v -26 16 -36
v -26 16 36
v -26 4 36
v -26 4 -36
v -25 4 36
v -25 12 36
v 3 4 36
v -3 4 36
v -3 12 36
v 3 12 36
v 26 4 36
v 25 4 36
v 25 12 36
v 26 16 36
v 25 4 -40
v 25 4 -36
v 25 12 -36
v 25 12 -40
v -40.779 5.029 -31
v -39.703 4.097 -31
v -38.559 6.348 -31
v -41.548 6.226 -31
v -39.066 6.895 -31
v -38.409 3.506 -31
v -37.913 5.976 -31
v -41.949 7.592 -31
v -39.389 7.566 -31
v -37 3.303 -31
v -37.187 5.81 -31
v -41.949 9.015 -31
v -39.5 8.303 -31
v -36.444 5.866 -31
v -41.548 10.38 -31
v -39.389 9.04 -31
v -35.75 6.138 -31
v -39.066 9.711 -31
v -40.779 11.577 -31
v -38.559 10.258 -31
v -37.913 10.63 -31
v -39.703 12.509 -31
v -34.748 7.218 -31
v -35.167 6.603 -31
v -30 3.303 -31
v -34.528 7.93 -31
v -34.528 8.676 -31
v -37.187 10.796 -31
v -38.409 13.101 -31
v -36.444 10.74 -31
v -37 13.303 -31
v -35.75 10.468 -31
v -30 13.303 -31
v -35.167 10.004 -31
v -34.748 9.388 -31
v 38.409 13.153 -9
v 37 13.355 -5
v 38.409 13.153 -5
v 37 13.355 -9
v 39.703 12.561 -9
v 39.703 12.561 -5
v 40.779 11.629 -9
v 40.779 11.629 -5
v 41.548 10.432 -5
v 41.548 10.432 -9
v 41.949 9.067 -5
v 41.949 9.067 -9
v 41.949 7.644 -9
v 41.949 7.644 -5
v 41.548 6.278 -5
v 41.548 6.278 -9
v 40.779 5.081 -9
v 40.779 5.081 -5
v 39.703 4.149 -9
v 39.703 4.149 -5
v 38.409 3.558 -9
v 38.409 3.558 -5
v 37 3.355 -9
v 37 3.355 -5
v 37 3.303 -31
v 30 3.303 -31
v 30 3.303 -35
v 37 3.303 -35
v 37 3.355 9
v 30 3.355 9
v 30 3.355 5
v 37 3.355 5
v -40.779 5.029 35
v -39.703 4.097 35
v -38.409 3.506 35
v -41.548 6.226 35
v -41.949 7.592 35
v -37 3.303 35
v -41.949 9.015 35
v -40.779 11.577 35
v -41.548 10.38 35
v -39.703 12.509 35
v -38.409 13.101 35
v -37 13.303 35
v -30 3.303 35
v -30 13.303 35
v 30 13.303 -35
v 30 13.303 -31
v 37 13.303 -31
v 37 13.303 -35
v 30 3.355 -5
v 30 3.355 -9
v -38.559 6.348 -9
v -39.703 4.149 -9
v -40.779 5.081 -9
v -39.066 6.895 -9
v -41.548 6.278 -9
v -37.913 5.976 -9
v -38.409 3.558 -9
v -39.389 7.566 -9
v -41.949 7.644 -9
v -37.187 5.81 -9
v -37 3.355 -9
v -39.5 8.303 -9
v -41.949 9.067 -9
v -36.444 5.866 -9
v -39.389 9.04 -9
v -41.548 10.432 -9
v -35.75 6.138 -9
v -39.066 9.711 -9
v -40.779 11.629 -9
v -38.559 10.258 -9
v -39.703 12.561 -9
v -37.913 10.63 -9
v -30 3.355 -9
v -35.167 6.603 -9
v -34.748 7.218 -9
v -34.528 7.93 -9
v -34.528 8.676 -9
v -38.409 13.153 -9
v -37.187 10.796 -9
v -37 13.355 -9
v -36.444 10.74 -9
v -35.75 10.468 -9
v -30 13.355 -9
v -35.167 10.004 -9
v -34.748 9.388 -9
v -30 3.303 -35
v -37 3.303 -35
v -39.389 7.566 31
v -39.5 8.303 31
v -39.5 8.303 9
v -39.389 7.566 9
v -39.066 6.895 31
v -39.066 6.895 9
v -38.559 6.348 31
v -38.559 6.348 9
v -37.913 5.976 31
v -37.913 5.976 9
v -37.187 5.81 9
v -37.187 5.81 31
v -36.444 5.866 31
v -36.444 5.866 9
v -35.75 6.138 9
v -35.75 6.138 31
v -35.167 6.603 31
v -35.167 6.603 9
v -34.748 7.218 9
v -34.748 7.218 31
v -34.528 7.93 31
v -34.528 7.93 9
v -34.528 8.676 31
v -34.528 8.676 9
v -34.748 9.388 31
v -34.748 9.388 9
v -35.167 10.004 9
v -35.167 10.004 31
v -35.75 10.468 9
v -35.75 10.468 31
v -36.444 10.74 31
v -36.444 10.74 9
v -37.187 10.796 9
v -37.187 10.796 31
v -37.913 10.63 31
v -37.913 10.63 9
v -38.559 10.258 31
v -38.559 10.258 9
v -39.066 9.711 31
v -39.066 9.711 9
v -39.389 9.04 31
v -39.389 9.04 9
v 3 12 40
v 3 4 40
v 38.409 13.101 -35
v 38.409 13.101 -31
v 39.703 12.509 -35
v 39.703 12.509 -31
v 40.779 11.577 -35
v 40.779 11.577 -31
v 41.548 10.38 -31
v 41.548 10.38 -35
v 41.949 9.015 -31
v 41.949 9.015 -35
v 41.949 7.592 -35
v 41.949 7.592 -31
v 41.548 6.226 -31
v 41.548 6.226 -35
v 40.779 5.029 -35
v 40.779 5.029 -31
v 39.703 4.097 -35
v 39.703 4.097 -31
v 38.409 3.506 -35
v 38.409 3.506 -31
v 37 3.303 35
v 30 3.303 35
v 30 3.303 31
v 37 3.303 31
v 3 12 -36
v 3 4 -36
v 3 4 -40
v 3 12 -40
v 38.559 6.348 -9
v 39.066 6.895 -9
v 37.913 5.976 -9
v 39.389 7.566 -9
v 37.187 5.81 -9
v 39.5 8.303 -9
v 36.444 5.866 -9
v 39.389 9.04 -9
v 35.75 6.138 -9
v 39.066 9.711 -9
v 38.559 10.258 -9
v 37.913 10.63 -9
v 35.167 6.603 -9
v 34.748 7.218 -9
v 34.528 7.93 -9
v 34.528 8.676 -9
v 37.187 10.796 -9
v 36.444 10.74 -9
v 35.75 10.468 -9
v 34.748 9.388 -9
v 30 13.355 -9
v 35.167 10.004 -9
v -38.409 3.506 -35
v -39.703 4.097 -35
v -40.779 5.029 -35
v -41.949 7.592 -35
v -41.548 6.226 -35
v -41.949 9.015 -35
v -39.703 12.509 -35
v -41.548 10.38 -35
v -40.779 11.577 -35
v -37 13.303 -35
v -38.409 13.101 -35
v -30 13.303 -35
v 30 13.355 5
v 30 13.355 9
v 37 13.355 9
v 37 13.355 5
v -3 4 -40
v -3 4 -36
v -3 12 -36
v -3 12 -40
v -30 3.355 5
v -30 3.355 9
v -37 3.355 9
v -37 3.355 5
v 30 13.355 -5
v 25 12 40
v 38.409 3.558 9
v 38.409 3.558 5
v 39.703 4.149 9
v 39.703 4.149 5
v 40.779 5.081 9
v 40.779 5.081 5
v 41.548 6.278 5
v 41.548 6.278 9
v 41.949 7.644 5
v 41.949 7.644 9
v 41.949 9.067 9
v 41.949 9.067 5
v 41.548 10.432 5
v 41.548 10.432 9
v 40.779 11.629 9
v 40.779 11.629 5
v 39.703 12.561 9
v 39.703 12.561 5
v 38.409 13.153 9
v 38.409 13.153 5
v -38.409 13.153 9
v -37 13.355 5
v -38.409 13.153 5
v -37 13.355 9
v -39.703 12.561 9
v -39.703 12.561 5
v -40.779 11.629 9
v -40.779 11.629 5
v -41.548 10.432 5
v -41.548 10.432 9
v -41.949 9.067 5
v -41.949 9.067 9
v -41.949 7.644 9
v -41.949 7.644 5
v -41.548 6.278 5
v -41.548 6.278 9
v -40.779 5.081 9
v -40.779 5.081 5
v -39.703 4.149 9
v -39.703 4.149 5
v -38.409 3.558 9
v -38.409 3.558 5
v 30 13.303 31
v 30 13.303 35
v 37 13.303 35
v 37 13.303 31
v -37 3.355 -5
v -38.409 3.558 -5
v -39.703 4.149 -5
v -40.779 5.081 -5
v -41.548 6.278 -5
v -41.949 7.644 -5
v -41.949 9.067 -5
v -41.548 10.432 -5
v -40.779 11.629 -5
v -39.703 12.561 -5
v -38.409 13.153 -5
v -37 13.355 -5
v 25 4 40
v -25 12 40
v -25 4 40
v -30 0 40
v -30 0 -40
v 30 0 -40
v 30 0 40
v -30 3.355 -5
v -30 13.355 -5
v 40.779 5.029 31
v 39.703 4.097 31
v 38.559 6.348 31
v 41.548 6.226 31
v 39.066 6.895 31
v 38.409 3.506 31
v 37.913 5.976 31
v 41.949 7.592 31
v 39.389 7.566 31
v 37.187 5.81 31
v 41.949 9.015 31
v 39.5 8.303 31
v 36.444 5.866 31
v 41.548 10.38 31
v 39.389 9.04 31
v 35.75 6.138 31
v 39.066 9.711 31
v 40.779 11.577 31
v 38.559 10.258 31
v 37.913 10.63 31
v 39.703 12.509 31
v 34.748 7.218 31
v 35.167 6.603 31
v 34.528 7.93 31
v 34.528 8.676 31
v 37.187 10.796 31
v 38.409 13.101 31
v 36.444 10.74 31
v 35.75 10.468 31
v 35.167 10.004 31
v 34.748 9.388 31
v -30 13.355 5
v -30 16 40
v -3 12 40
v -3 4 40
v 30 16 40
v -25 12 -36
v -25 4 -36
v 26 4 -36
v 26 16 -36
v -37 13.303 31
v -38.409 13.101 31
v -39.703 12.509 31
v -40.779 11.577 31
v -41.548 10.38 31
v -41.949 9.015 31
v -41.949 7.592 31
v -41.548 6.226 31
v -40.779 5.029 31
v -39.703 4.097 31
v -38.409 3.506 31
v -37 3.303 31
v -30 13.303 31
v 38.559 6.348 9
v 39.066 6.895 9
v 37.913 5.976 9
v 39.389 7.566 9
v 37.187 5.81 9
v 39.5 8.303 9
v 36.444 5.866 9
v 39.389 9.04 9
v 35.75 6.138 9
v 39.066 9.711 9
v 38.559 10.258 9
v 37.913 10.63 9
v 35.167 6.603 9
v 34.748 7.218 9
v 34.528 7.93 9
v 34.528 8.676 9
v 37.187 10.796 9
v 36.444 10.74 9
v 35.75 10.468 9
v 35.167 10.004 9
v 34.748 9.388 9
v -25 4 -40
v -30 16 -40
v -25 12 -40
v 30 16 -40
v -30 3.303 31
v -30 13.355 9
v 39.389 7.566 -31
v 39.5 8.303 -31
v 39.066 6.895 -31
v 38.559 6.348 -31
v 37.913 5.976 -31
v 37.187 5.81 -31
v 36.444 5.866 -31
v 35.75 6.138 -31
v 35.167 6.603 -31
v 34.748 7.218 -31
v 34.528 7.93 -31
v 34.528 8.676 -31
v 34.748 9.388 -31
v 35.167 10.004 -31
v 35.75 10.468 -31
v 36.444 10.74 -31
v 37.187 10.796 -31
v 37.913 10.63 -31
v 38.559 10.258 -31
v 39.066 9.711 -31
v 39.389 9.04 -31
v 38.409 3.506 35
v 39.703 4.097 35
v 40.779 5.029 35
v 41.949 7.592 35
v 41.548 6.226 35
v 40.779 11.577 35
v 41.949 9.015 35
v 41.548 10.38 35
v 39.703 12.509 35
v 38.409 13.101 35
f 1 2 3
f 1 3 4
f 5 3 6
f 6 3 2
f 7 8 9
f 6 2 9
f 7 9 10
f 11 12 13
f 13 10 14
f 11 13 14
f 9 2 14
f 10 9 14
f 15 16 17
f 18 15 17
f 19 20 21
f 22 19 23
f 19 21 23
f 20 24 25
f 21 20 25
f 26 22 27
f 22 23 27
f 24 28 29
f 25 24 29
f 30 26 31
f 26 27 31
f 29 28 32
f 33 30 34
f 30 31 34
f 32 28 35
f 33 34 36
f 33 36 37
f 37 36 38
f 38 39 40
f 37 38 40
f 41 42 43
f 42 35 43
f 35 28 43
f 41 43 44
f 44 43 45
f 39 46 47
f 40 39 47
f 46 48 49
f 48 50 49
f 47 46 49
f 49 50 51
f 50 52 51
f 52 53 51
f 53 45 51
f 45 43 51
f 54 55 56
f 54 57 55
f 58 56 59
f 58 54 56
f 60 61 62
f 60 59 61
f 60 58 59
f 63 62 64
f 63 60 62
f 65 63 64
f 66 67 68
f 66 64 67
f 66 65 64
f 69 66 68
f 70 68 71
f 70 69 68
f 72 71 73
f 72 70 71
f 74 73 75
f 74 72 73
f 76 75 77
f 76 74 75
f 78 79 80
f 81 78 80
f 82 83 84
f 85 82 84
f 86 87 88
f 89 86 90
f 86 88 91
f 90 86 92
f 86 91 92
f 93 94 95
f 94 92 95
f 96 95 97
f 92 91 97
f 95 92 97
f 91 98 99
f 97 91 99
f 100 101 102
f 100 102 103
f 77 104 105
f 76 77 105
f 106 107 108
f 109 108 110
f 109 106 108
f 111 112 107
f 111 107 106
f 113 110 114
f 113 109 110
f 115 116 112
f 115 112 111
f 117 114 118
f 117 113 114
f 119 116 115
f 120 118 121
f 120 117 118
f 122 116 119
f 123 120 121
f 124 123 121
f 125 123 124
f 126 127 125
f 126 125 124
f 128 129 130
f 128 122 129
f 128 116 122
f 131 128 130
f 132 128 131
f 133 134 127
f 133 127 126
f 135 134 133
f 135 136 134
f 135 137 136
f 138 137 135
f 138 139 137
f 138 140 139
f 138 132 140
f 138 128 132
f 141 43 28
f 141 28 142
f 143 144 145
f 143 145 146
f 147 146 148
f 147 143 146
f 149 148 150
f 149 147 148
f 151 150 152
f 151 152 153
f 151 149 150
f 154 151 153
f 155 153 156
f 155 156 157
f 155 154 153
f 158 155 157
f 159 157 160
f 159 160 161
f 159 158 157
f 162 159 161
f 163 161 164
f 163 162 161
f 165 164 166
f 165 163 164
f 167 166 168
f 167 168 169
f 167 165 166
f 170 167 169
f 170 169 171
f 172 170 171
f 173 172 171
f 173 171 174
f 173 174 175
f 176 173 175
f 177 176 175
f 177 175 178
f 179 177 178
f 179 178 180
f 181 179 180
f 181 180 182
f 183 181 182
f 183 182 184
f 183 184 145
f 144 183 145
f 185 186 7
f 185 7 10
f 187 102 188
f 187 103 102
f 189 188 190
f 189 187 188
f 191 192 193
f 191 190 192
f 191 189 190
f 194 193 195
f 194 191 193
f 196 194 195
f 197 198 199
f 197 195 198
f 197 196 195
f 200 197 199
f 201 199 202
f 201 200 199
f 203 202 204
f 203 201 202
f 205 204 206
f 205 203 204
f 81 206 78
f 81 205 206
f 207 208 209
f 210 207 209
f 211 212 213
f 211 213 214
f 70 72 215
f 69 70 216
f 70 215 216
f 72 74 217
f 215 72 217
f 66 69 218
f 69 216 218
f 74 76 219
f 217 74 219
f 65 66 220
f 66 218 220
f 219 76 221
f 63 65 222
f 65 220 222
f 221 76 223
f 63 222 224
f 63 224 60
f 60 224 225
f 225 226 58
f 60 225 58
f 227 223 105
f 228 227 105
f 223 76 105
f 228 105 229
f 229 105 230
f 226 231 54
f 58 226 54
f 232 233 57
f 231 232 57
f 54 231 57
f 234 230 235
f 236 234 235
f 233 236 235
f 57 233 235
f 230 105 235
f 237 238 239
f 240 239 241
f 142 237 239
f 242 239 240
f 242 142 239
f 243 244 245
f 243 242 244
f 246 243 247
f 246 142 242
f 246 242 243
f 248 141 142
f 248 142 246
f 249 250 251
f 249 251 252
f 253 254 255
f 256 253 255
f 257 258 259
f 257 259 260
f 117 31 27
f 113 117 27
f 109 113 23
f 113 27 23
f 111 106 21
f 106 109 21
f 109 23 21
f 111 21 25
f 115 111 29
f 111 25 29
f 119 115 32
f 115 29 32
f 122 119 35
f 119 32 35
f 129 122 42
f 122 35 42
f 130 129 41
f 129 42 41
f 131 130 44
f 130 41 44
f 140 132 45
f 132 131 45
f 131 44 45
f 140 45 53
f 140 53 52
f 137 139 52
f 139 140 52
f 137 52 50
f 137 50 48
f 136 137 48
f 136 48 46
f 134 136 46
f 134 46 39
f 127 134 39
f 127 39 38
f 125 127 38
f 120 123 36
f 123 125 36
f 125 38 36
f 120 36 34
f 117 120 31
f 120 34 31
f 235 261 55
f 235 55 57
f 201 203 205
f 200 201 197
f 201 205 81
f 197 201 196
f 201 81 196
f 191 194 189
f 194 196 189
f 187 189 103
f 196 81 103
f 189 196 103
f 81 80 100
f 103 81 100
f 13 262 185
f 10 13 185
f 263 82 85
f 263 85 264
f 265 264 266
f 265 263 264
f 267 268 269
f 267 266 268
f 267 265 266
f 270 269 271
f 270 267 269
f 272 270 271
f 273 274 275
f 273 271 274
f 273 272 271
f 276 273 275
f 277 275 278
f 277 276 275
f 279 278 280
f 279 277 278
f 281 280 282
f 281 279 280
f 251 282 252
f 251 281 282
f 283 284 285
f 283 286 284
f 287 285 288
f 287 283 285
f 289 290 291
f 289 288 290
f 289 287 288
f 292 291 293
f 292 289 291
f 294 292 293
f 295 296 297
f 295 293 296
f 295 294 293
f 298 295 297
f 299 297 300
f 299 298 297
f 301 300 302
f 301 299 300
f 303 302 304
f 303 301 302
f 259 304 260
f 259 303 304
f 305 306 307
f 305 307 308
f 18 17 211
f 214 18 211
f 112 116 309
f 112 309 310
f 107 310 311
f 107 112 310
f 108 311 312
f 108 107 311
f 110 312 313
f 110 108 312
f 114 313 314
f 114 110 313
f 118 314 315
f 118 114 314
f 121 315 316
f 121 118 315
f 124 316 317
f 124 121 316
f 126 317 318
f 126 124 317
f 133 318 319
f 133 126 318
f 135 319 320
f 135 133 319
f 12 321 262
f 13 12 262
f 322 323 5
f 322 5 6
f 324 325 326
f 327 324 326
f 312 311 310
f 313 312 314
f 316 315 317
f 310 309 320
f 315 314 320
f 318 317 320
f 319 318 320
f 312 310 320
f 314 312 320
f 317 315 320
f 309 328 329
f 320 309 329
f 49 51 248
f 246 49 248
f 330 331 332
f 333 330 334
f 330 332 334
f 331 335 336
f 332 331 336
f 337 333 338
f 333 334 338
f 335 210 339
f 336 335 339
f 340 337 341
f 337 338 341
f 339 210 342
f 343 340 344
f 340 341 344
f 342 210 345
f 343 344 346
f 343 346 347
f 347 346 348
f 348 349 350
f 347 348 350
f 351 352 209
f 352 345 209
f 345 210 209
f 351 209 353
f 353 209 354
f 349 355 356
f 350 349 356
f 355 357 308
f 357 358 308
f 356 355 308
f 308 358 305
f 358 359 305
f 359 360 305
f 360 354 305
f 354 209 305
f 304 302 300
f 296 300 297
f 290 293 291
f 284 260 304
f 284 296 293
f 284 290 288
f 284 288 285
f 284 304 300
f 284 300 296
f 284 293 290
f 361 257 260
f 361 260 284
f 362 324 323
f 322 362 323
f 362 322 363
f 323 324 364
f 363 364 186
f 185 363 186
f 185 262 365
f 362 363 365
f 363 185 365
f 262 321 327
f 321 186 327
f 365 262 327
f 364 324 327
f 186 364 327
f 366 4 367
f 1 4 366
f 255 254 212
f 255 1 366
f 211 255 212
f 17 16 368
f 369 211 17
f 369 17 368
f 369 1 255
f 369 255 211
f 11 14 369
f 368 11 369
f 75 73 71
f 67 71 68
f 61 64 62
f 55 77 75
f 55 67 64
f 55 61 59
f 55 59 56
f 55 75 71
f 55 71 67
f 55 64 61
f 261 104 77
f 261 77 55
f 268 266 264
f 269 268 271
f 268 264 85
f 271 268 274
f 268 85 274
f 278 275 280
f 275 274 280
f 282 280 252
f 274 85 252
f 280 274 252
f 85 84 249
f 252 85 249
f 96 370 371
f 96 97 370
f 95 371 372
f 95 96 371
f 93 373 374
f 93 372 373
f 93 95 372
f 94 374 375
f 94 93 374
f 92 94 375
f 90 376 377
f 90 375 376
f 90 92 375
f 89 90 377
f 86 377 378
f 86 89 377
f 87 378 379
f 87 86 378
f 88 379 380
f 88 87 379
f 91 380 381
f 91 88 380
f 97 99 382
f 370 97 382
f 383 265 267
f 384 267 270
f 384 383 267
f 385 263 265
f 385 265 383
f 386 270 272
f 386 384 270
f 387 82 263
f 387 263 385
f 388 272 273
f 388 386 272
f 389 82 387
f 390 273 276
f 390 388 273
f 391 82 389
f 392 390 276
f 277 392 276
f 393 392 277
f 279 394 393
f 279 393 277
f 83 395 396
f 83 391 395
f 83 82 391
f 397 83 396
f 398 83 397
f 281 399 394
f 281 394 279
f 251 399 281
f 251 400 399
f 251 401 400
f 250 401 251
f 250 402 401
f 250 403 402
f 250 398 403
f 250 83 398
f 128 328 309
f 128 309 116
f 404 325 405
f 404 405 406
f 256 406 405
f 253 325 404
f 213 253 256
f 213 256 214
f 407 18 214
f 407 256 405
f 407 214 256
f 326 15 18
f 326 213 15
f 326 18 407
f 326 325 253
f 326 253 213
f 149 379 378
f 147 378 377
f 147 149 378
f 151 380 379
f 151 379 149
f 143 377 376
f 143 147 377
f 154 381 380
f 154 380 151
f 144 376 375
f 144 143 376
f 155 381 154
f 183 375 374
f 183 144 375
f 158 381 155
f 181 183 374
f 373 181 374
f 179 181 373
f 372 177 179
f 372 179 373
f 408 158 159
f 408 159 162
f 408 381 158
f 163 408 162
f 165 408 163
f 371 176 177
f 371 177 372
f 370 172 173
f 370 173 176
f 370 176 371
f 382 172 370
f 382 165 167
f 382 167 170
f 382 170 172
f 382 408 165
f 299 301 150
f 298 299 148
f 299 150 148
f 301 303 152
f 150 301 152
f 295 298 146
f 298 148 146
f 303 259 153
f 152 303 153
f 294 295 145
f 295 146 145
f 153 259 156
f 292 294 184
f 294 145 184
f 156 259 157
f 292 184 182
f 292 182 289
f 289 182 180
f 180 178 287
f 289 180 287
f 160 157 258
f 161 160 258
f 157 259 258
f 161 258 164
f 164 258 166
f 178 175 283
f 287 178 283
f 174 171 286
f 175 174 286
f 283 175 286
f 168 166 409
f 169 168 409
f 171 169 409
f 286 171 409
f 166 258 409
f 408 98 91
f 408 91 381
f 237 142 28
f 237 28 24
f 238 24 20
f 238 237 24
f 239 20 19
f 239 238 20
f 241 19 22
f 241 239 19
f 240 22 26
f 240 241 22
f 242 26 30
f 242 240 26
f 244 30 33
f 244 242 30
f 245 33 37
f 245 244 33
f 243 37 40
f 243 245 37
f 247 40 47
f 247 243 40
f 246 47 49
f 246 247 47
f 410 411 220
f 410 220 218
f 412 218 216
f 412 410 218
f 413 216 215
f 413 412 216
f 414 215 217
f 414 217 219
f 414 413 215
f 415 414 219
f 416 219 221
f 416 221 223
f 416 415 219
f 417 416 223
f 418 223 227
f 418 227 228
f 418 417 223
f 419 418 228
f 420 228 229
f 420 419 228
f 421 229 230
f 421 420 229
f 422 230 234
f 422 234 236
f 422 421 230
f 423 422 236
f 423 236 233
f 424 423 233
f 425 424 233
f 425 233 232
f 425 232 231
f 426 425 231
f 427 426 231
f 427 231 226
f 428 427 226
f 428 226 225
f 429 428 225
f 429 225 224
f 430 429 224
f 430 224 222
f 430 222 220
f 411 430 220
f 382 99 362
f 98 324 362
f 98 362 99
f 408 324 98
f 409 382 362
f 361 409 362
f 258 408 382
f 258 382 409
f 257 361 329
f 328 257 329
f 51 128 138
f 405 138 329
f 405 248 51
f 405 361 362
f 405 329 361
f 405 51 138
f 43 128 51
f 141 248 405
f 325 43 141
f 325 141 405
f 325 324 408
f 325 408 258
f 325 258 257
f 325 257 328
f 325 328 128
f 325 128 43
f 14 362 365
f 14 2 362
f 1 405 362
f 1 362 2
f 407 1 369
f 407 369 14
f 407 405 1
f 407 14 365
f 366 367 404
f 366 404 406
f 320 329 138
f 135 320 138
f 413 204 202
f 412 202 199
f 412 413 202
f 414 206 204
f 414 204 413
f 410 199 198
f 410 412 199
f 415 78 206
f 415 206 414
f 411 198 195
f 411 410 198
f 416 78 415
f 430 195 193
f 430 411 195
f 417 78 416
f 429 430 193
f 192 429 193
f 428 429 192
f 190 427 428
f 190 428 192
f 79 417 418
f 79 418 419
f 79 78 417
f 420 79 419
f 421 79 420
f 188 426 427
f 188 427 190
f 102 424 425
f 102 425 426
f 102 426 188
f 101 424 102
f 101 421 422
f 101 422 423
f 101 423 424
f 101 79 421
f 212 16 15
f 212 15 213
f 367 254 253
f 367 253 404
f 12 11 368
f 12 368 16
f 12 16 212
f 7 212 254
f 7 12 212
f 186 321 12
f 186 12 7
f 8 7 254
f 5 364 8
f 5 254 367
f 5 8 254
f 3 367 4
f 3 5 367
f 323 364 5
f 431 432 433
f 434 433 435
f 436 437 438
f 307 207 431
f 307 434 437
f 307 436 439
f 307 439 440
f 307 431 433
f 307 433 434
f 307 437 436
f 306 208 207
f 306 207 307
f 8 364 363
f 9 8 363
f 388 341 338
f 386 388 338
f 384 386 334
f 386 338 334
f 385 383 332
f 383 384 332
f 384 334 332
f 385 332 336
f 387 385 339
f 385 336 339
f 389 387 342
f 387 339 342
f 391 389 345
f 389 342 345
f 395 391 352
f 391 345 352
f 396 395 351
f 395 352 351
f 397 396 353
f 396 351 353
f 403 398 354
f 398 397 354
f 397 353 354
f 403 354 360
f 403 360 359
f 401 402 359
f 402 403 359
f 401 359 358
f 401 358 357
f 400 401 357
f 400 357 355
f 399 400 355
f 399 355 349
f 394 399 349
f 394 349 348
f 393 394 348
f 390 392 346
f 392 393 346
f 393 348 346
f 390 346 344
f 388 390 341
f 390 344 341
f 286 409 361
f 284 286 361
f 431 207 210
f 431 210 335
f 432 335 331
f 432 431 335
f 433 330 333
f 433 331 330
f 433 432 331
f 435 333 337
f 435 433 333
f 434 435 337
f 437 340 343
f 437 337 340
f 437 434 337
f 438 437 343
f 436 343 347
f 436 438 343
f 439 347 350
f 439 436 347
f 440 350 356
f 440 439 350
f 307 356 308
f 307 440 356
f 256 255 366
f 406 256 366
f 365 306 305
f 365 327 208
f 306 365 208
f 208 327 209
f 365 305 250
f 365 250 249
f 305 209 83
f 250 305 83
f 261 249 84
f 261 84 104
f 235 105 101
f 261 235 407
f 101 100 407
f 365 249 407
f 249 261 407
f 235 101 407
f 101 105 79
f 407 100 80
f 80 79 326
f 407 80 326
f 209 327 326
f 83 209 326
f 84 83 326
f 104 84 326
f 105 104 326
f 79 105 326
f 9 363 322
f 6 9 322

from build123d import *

# Parameters (mm, degrees)
SKETCH2_W                   = 60
SKETCH2_H                   = 80
BOSS_EXTRUDE2_DEPTH         = 16
SKETCH6_W                   = 52
SKETCH6_H                   = 72
CUT_EXTRUDE1_DEPTH          = 12
CUT_EXTRUDE2_DEPTH          = 16
CUT_EXTRUDE2_DEPTH_BACK     = 106
SKETCH7_W                   = 22
SKETCH7_H                   = 8
SKETCH8_W                   = 4
SKETCH8_H                   = 10
BOSS_EXTRUDE3_DEPTH         = 12
FILLET1_RADIUS              = 5
FILLET1_LENGTH              = 4
FILLET2_RADIUS              = 5
FILLET2_LENGTH              = 4
FILLET3_RADIUS              = 5
FILLET3_LENGTH              = 4
FILLET4_RADIUS              = 5
FILLET4_LENGTH              = 4
BOSS_EXTRUDE4_START         = -2
SKETCH9_R                   = 2.5
BOSS_EXTRUDE4_DEPTH         = 26
MIRROR2_START               = -2
MIRROR2_COPY_1_SKETCH_R     = 2.5
MIRROR2_COPY_1_DEPTH        = 26
FILLET1_OF_MIRROR2_2_RADIUS = 5
FILLET1_OF_MIRROR2_2_LENGTH = 4
FILLET2_OF_MIRROR2_2_RADIUS = 5
FILLET2_OF_MIRROR2_2_LENGTH = 4
FILLET3_OF_MIRROR2_2_RADIUS = 5
FILLET3_OF_MIRROR2_2_LENGTH = 4
FILLET4_OF_MIRROR2_2_RADIUS = 5
FILLET4_OF_MIRROR2_2_LENGTH = 4


with BuildPart() as part:
    # Sketch2 → Boss-Extrude2 (new body)
    with BuildSketch(Plane(origin=(0, 0, 0), x_dir=(1, 0, 0), z_dir=(0, 1, 0))):
        Rectangle(SKETCH2_W, SKETCH2_H)
    extrude(amount=BOSS_EXTRUDE2_DEPTH)

    # Sketch6 → Cut-Extrude1 (cut)
    with BuildSketch(Plane(origin=(0, 16, 0), x_dir=(1, 0, 0), z_dir=(0, 1, 0))):
        Rectangle(SKETCH6_W, SKETCH6_H)
    extrude(amount=-CUT_EXTRUDE1_DEPTH, mode=Mode.SUBTRACT)

    # Sketch7 → Cut-Extrude2 (cut, two sides: drawn at the far end of the back side and taken through both)
    with BuildSketch(Plane(origin=(0, 0, -40), x_dir=(-1, 0, 0), z_dir=(0, 0, -1)).offset(-CUT_EXTRUDE2_DEPTH_BACK)):
        with Locations((-14, 8)):
            Rectangle(SKETCH7_W, SKETCH7_H)
        with Locations((14, 8)):
            Rectangle(SKETCH7_W, SKETCH7_H)
    extrude(amount=CUT_EXTRUDE2_DEPTH + CUT_EXTRUDE2_DEPTH_BACK, mode=Mode.SUBTRACT)

    # Sketch8 → Boss-Extrude3 (add)
    with BuildSketch(Plane(origin=(30, 0, 0), x_dir=(0, 0, -1), z_dir=(1, 0, 0))):
        with Locations((-33, 8.303078398)):
            Rectangle(SKETCH8_W, SKETCH8_H)
        with Locations((-7, 8.355173675)):
            Rectangle(SKETCH8_W, SKETCH8_H)
        with Locations((7, 8.355173675)):
            Rectangle(SKETCH8_W, SKETCH8_H)
        with Locations((33, 8.303078398)):
            Rectangle(SKETCH8_W, SKETCH8_H)
    boss_extrude3 = extrude(amount=BOSS_EXTRUDE3_DEPTH)

    # Fillet1: full round fillet: the end face becomes a half cylinder, R = half its width
    fillet1_face = Plane((42, 8.303078398, 33), x_dir=(0, 0, 1), z_dir=(1, 0, 0))  # on the end face: x along it, z out of the body
    fillet1_slab = fillet1_face.offset(-FILLET1_RADIUS / 2) * Box(FILLET1_LENGTH, 2 * FILLET1_RADIUS, FILLET1_RADIUS, mode=Mode.PRIVATE)  # the body's end, R deep
    fillet1_round = Plane((37, 8.303078398, 33), x_dir=(1, 0, 0), z_dir=(0, 0, 1)) * Cylinder(FILLET1_RADIUS, FILLET1_LENGTH, mode=Mode.PRIVATE)  # its axis R under the face
    add(fillet1_slab - fillet1_round, mode=Mode.SUBTRACT)

    # Fillet2: full round fillet: the end face becomes a half cylinder, R = half its width
    fillet2_face = Plane((42, 8.355173675, 7), x_dir=(0, 0, 1), z_dir=(1, 0, 0))  # on the end face: x along it, z out of the body
    fillet2_slab = fillet2_face.offset(-FILLET2_RADIUS / 2) * Box(FILLET2_LENGTH, 2 * FILLET2_RADIUS, FILLET2_RADIUS, mode=Mode.PRIVATE)  # the body's end, R deep
    fillet2_round = Plane((37, 8.355173675, 7), x_dir=(1, 0, 0), z_dir=(0, 0, 1)) * Cylinder(FILLET2_RADIUS, FILLET2_LENGTH, mode=Mode.PRIVATE)  # its axis R under the face
    add(fillet2_slab - fillet2_round, mode=Mode.SUBTRACT)

    # Fillet3: full round fillet: the end face becomes a half cylinder, R = half its width
    fillet3_face = Plane((42, 8.355173675, -7), x_dir=(0, 0, -1), z_dir=(1, 0, 0))  # on the end face: x along it, z out of the body
    fillet3_slab = fillet3_face.offset(-FILLET3_RADIUS / 2) * Box(FILLET3_LENGTH, 2 * FILLET3_RADIUS, FILLET3_RADIUS, mode=Mode.PRIVATE)  # the body's end, R deep
    fillet3_round = Plane((37, 8.355173675, -7), x_dir=(1, 0, 0), z_dir=(0, 0, -1)) * Cylinder(FILLET3_RADIUS, FILLET3_LENGTH, mode=Mode.PRIVATE)  # its axis R under the face
    add(fillet3_slab - fillet3_round, mode=Mode.SUBTRACT)

    # Fillet4: full round fillet: the end face becomes a half cylinder, R = half its width
    fillet4_face = Plane((42, 8.303078398, -33), x_dir=(0, 0, -1), z_dir=(1, 0, 0))  # on the end face: x along it, z out of the body
    fillet4_slab = fillet4_face.offset(-FILLET4_RADIUS / 2) * Box(FILLET4_LENGTH, 2 * FILLET4_RADIUS, FILLET4_RADIUS, mode=Mode.PRIVATE)  # the body's end, R deep
    fillet4_round = Plane((37, 8.303078398, -33), x_dir=(1, 0, 0), z_dir=(0, 0, -1)) * Cylinder(FILLET4_RADIUS, FILLET4_LENGTH, mode=Mode.PRIVATE)  # its axis R under the face
    add(fillet4_slab - fillet4_round, mode=Mode.SUBTRACT)

    # Sketch9 → Boss-Extrude4 (add)
    with BuildSketch(Plane(origin=(0, 0, 31), x_dir=(-1, 0, 0), z_dir=(0, 0, -1)).offset(BOSS_EXTRUDE4_START)):
        with Locations(Location((-37, 8.303078398, 0), (0, 0, 180))):
            Circle(SKETCH9_R)
    boss_extrude4 = extrude(amount=BOSS_EXTRUDE4_DEPTH)

    # Mirror1: Boss-Extrude4 across plane
    add(boss_extrude4.mirror(Plane(origin=(0, 0, 0), x_dir=(1, 0, 0), z_dir=(0, 0, -1))))

    # Mirror2: Boss-Extrude3, Boss-Extrude4 across plane
    add(boss_extrude3.mirror(Plane(origin=(0, 0, 0), x_dir=(0, 0, 1), z_dir=(1, 0, 0))))
    add(boss_extrude4.mirror(Plane(origin=(0, 0, 0), x_dir=(0, 0, 1), z_dir=(1, 0, 0))))

    # Mirror2 copy 1 sketch → Mirror2 copy 1 (add)
    with BuildSketch(Plane.XY.offset(-31).offset(MIRROR2_START)):
        with Locations(Location((-37, 8.303078398, 0), (0, 0, 180))):
            Circle(MIRROR2_COPY_1_SKETCH_R)
    extrude(amount=MIRROR2_COPY_1_DEPTH)

    # Fillet1 of Mirror2 2: full round fillet: the end face becomes a half cylinder, R = half its width
    fillet1_of_mirror2_2_face = Plane((-42, 8.303078398, 33), x_dir=(0, 0, 1), z_dir=(-1, 0, 0))  # on the end face: x along it, z out of the body
    fillet1_of_mirror2_2_slab = fillet1_of_mirror2_2_face.offset(-FILLET1_OF_MIRROR2_2_RADIUS / 2) * Box(FILLET1_OF_MIRROR2_2_LENGTH, 2 * FILLET1_OF_MIRROR2_2_RADIUS, FILLET1_OF_MIRROR2_2_RADIUS, mode=Mode.PRIVATE)  # the body's end, R deep
    fillet1_of_mirror2_2_round = Plane((-37, 8.303078398, 33), x_dir=(-1, 0, 0), z_dir=(0, 0, 1)) * Cylinder(FILLET1_OF_MIRROR2_2_RADIUS, FILLET1_OF_MIRROR2_2_LENGTH, mode=Mode.PRIVATE)  # its axis R under the face
    add(fillet1_of_mirror2_2_slab - fillet1_of_mirror2_2_round, mode=Mode.SUBTRACT)

    # Fillet2 of Mirror2 2: full round fillet: the end face becomes a half cylinder, R = half its width
    fillet2_of_mirror2_2_face = Plane((-42, 8.355173675, 7), x_dir=(0, 0, 1), z_dir=(-1, 0, 0))  # on the end face: x along it, z out of the body
    fillet2_of_mirror2_2_slab = fillet2_of_mirror2_2_face.offset(-FILLET2_OF_MIRROR2_2_RADIUS / 2) * Box(FILLET2_OF_MIRROR2_2_LENGTH, 2 * FILLET2_OF_MIRROR2_2_RADIUS, FILLET2_OF_MIRROR2_2_RADIUS, mode=Mode.PRIVATE)  # the body's end, R deep
    fillet2_of_mirror2_2_round = Plane((-37, 8.355173675, 7), x_dir=(-1, 0, 0), z_dir=(0, 0, 1)) * Cylinder(FILLET2_OF_MIRROR2_2_RADIUS, FILLET2_OF_MIRROR2_2_LENGTH, mode=Mode.PRIVATE)  # its axis R under the face
    add(fillet2_of_mirror2_2_slab - fillet2_of_mirror2_2_round, mode=Mode.SUBTRACT)

    # Fillet3 of Mirror2 2: full round fillet: the end face becomes a half cylinder, R = half its width
    fillet3_of_mirror2_2_face = Plane((-42, 8.355173675, -7), x_dir=(0, 0, -1), z_dir=(-1, 0, 0))  # on the end face: x along it, z out of the body
    fillet3_of_mirror2_2_slab = fillet3_of_mirror2_2_face.offset(-FILLET3_OF_MIRROR2_2_RADIUS / 2) * Box(FILLET3_OF_MIRROR2_2_LENGTH, 2 * FILLET3_OF_MIRROR2_2_RADIUS, FILLET3_OF_MIRROR2_2_RADIUS, mode=Mode.PRIVATE)  # the body's end, R deep
    fillet3_of_mirror2_2_round = Plane((-37, 8.355173675, -7), x_dir=(-1, 0, 0), z_dir=(0, 0, -1)) * Cylinder(FILLET3_OF_MIRROR2_2_RADIUS, FILLET3_OF_MIRROR2_2_LENGTH, mode=Mode.PRIVATE)  # its axis R under the face
    add(fillet3_of_mirror2_2_slab - fillet3_of_mirror2_2_round, mode=Mode.SUBTRACT)

    # Fillet4 of Mirror2 2: full round fillet: the end face becomes a half cylinder, R = half its width
    fillet4_of_mirror2_2_face = Plane((-42, 8.303078398, -33), x_dir=(0, 0, -1), z_dir=(-1, 0, 0))  # on the end face: x along it, z out of the body
    fillet4_of_mirror2_2_slab = fillet4_of_mirror2_2_face.offset(-FILLET4_OF_MIRROR2_2_RADIUS / 2) * Box(FILLET4_OF_MIRROR2_2_LENGTH, 2 * FILLET4_OF_MIRROR2_2_RADIUS, FILLET4_OF_MIRROR2_2_RADIUS, mode=Mode.PRIVATE)  # the body's end, R deep
    fillet4_of_mirror2_2_round = Plane((-37, 8.303078398, -33), x_dir=(-1, 0, 0), z_dir=(0, 0, -1)) * Cylinder(FILLET4_OF_MIRROR2_2_RADIUS, FILLET4_OF_MIRROR2_2_LENGTH, mode=Mode.PRIVATE)  # its axis R under the face
    add(fillet4_of_mirror2_2_slab - fillet4_of_mirror2_2_round, mode=Mode.SUBTRACT)


solid = part.part
